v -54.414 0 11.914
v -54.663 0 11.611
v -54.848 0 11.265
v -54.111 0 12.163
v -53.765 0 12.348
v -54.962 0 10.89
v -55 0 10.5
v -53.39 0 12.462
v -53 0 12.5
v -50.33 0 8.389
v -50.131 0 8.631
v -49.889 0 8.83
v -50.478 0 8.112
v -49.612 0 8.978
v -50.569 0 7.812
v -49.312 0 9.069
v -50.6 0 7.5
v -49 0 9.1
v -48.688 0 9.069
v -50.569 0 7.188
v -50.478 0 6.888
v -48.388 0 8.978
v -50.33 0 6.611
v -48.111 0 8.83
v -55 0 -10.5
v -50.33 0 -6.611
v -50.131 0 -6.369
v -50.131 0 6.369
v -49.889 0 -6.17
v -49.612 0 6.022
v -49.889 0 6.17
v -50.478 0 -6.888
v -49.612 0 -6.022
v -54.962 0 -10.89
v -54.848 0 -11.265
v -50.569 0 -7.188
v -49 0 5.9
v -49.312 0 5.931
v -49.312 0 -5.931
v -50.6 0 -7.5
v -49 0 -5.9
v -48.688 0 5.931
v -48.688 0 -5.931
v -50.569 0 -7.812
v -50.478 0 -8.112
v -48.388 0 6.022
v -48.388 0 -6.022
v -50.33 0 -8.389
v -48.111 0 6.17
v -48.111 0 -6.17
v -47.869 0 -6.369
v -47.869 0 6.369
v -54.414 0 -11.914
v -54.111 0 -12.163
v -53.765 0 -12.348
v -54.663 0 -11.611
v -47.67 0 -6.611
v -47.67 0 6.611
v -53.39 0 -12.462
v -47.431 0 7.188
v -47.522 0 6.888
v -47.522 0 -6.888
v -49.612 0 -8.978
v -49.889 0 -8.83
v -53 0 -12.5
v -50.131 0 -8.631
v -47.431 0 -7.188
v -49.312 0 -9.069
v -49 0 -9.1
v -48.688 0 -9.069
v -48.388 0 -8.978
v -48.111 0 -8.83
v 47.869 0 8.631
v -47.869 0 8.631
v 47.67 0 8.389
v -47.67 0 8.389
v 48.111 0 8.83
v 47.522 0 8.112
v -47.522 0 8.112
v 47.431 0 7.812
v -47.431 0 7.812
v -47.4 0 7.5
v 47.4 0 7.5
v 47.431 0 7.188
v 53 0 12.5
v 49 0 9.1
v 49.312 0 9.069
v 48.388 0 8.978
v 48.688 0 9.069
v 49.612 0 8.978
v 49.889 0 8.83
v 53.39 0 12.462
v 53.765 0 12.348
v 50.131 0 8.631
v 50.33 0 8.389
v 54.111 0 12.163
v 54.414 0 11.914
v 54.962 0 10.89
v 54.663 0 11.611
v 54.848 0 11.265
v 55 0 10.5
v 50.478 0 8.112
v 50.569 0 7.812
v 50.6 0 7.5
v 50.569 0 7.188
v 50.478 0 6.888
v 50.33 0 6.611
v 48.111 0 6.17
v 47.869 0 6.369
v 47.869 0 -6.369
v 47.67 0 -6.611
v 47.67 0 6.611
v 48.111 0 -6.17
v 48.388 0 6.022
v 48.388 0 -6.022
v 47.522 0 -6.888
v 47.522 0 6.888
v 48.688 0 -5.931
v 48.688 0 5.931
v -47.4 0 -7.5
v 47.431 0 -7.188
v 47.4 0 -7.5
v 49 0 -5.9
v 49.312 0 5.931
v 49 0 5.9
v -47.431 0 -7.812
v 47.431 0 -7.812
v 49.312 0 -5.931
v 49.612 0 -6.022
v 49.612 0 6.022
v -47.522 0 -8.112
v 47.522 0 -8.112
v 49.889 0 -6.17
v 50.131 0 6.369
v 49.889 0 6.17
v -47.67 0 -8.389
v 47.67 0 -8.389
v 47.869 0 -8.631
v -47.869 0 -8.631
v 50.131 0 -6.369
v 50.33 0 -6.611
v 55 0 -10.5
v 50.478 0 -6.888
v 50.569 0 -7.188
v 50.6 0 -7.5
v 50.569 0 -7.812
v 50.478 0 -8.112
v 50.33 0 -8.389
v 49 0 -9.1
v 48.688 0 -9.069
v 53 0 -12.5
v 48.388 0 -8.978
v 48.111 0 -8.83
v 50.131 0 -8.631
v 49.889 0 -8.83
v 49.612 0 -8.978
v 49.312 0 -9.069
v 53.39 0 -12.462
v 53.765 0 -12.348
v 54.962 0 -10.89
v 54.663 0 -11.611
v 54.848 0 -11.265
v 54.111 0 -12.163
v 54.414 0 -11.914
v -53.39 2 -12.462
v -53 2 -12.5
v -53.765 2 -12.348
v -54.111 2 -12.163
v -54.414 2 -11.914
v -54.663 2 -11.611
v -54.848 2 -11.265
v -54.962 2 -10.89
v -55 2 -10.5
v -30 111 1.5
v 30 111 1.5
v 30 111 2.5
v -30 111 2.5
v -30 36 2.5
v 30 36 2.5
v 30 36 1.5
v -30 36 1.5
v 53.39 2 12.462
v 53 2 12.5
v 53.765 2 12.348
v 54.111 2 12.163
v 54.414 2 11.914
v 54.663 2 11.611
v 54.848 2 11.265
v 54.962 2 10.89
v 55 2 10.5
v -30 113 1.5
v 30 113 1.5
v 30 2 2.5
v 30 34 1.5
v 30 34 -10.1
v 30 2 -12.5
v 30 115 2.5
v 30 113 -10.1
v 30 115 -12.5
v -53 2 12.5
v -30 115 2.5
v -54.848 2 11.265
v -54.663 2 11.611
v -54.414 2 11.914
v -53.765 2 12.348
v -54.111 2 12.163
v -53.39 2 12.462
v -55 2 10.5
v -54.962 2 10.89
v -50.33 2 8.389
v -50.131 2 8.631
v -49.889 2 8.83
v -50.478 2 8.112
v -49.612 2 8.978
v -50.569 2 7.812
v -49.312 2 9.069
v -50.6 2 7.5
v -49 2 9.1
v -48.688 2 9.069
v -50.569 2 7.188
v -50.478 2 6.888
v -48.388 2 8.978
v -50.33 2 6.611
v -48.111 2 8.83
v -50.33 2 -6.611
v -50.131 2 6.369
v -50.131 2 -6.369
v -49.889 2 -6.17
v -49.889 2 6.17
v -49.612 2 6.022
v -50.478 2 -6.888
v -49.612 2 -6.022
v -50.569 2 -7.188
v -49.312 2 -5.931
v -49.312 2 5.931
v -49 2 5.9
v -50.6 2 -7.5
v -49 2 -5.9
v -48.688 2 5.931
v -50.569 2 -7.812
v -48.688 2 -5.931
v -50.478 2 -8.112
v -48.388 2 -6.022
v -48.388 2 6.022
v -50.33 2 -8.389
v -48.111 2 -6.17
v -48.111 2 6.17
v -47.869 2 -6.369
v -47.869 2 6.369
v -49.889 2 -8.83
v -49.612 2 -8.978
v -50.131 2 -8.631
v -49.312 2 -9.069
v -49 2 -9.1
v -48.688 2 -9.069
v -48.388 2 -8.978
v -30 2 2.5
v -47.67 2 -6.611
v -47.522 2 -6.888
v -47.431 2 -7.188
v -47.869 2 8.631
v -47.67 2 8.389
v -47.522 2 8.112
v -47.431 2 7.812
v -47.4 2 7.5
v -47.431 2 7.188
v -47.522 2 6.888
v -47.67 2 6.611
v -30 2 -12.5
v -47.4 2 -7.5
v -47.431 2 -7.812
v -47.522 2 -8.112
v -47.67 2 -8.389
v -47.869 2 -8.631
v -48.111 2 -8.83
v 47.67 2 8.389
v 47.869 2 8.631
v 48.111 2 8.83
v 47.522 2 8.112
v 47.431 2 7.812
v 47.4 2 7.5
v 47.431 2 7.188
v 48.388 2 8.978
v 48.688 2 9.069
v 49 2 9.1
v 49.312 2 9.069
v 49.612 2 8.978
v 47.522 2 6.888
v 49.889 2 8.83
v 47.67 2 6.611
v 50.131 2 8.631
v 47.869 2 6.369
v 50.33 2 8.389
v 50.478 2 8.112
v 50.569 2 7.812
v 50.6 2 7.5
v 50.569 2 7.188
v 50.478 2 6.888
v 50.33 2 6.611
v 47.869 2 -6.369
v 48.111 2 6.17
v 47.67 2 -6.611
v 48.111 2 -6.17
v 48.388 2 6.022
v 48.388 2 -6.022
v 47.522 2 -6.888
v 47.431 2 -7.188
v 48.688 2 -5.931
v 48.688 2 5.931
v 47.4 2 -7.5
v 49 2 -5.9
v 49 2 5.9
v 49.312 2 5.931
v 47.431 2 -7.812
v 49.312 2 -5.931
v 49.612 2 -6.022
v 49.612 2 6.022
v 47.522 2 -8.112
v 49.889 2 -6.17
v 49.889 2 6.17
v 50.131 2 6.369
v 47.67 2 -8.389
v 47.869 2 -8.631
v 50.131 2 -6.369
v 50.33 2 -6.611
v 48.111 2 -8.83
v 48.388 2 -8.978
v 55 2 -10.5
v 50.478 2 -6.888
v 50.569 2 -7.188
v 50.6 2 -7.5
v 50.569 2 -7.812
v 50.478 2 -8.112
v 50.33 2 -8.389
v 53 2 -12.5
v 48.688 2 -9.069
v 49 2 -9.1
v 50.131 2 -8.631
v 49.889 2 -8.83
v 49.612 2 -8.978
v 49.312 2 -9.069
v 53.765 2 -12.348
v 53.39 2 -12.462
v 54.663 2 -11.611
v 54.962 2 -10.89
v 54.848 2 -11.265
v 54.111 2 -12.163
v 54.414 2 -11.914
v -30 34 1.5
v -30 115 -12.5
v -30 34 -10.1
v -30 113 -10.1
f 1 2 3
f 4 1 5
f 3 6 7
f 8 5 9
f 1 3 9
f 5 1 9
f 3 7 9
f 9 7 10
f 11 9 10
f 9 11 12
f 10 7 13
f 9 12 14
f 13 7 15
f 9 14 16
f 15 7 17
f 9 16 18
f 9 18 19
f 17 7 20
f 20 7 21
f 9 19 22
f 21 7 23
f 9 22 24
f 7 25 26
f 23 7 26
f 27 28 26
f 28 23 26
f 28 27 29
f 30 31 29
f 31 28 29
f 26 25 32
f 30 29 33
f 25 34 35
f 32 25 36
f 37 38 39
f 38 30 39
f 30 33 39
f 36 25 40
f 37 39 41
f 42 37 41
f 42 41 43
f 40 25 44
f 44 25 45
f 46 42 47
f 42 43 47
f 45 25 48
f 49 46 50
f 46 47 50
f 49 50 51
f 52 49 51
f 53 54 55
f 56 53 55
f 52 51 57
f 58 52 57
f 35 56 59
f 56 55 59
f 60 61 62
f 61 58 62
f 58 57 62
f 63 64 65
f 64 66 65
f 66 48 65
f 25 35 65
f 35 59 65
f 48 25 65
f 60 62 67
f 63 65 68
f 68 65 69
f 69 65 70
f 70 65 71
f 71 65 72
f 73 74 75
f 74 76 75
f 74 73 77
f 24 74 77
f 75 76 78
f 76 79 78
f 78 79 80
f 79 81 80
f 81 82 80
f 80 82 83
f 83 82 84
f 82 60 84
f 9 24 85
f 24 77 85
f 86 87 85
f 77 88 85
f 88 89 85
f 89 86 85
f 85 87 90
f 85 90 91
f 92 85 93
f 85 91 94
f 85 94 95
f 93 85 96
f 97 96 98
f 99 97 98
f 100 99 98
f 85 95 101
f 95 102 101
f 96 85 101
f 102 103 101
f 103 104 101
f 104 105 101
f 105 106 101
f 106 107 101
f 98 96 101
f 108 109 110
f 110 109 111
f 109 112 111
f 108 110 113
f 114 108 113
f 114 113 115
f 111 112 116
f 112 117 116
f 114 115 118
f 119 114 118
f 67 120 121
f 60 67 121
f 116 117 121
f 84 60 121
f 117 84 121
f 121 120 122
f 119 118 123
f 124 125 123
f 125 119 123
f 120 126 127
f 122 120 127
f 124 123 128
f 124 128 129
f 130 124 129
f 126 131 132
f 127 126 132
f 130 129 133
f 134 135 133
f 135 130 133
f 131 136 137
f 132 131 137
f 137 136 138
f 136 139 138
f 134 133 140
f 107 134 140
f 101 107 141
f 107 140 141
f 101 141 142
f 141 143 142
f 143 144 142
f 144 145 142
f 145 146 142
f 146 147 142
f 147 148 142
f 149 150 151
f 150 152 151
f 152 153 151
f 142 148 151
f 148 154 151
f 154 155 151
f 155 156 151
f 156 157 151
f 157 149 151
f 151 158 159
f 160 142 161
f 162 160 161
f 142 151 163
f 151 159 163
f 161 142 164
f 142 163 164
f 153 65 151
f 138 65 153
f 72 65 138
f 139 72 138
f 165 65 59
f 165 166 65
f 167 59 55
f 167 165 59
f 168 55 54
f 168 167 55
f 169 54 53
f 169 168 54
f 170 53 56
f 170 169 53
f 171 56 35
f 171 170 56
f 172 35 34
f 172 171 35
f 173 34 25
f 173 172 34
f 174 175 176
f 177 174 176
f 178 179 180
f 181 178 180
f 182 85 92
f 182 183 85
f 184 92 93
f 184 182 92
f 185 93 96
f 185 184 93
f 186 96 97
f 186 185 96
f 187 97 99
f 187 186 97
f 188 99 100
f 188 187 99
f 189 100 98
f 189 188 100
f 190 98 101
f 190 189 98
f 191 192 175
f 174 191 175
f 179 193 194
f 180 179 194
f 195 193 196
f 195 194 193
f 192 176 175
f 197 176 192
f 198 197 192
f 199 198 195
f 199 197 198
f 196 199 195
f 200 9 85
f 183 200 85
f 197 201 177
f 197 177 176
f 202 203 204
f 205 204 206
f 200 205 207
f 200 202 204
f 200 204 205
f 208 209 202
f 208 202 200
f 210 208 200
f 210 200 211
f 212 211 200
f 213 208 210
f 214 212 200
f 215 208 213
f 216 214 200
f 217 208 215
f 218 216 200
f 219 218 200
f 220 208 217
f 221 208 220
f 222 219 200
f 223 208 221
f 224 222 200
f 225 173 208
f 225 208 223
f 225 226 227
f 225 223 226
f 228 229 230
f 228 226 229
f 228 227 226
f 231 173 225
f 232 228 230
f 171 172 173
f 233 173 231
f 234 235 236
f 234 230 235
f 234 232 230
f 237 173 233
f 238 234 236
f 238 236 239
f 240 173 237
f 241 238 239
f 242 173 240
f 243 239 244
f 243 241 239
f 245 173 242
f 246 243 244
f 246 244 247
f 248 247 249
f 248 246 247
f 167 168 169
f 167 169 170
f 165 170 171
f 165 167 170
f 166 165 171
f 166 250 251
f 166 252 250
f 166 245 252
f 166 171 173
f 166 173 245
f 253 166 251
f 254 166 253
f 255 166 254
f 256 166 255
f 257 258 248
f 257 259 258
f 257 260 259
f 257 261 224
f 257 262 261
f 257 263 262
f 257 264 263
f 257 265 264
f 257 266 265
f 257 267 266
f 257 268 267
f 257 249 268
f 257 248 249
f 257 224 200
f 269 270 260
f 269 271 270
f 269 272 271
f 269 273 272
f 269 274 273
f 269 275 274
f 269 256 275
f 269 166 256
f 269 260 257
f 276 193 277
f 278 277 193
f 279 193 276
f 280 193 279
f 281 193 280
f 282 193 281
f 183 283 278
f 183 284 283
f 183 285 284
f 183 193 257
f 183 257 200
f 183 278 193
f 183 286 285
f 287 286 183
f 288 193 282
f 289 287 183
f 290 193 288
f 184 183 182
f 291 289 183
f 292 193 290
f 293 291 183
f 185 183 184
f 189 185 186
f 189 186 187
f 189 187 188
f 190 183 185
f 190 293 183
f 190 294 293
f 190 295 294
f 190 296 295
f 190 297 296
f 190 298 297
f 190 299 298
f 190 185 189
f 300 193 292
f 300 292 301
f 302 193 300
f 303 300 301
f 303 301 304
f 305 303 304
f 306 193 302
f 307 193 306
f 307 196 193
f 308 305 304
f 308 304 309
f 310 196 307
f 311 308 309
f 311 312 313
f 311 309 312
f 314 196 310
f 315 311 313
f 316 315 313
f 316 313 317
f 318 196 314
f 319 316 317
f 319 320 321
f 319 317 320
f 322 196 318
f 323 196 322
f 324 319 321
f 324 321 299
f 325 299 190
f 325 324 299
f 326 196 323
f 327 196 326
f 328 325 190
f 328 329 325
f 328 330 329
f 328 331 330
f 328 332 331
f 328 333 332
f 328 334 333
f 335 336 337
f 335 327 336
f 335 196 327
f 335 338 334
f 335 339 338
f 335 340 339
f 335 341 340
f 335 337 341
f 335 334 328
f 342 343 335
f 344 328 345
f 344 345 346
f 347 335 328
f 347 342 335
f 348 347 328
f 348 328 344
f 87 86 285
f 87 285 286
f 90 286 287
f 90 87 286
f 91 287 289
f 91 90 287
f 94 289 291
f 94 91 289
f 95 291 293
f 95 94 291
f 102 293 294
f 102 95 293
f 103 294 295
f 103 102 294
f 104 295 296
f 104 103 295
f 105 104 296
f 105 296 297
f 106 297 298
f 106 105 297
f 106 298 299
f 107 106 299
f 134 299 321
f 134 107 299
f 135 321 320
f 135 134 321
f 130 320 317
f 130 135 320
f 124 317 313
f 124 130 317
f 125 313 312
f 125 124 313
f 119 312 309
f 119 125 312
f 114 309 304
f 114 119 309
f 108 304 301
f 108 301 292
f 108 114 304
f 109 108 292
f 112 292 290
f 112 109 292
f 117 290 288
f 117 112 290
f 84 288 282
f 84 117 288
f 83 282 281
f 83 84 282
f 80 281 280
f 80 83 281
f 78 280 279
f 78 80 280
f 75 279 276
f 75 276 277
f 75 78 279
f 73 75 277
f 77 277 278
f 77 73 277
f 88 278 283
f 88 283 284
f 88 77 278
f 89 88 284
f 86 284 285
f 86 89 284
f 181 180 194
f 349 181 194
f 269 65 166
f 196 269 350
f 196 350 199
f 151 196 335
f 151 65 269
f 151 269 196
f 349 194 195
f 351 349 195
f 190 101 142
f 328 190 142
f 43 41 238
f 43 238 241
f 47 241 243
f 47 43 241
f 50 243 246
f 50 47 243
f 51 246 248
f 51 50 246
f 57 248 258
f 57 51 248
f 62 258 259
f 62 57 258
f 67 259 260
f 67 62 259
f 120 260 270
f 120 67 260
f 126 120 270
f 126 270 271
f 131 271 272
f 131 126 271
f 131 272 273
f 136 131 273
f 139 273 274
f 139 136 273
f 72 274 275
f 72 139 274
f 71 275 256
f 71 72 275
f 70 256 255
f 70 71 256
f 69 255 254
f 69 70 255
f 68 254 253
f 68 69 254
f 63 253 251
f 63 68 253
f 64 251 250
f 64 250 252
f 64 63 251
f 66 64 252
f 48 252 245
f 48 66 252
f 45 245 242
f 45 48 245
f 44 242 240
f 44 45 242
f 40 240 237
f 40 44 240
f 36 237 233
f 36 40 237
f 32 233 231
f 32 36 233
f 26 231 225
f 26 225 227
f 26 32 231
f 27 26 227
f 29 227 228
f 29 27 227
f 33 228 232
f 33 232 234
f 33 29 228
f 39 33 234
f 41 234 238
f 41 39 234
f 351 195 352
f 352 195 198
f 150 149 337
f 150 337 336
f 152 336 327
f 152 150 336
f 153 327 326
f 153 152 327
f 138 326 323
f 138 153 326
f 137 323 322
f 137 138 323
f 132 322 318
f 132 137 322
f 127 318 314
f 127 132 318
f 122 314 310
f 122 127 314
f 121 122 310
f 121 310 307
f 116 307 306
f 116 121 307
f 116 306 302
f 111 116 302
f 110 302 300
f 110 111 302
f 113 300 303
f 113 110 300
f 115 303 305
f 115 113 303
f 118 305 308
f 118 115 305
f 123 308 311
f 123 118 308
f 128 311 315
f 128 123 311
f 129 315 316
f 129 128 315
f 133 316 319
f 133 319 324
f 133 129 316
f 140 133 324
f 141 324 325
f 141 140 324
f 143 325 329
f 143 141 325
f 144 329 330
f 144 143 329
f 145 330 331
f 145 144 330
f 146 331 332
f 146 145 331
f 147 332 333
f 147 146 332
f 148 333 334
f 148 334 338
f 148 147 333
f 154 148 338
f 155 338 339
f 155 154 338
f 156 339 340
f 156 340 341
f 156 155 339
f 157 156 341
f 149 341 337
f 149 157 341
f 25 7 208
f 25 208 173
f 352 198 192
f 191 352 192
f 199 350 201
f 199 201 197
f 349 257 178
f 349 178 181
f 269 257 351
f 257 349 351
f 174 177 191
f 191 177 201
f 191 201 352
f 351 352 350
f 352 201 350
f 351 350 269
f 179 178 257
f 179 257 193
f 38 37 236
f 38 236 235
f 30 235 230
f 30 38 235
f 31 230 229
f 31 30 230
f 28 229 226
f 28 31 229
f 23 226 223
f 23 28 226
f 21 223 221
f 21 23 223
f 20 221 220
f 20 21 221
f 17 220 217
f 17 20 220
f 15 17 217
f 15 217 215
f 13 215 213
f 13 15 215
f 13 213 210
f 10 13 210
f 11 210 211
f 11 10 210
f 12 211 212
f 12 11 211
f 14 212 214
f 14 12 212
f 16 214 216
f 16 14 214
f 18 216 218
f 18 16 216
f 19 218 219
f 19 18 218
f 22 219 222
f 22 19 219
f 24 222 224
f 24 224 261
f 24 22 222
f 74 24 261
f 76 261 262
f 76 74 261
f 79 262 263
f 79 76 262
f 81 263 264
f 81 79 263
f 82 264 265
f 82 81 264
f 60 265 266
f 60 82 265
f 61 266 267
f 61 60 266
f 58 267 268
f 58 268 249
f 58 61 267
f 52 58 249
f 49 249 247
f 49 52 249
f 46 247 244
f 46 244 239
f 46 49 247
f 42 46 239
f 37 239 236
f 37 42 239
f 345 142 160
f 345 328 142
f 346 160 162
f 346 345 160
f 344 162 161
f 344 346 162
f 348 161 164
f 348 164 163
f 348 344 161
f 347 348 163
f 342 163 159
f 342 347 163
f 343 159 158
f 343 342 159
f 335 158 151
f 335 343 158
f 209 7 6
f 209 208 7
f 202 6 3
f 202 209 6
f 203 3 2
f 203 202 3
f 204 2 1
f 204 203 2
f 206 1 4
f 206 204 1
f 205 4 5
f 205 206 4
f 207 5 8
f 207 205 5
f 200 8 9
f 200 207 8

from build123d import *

# Parameters (mm, degrees)
SKETCH_1_W          = 110
SKETCH_1_H          = 25
SKETCH_1_R          = 1.6
EXTRUDE_1_DEPTH     = 2
SKETCH_2_W          = 60
SKETCH_2_H          = 15
EXTRUDE_2_DEPTH     = 113
CUT_EXTRUDE_1_DEPTH = 60
FILLET_1_R          = 2
FILLET_2_R          = 2
FILLET_3_R          = 2
FILLET_4_R          = 2


with BuildPart() as part:
    # 草图1 → 凸台-拉伸1 (new body)
    with BuildSketch(Plane(origin=(0, 0, 0), x_dir=(1, 0, 0), z_dir=(0, 1, 0))):
        Rectangle(SKETCH_1_W, SKETCH_1_H)
        with Locations(Location((-49, 7.5, 0), (0, 0, 270))):
            Circle(SKETCH_1_R, mode=Mode.SUBTRACT)
        with Locations(Location((49, 7.5, 0), (0, 0, 90))):
            Circle(SKETCH_1_R, mode=Mode.SUBTRACT)
        with Locations(Location((49, -7.5, 0), (0, 0, 270))):
            Circle(SKETCH_1_R, mode=Mode.SUBTRACT)
        with Locations(Location((-49, -7.5, 0), (0, 0, 90))):
            Circle(SKETCH_1_R, mode=Mode.SUBTRACT)
    extrude(amount=EXTRUDE_1_DEPTH)

    # 草图2 → 凸台-拉伸2 (add)
    with BuildSketch(Plane(origin=(0, 115, 0), x_dir=(1, 0, 0), z_dir=(0, 1, 0))):
        with Locations((0, 5)):
            Rectangle(SKETCH_2_W, SKETCH_2_H)
    extrude(amount=-EXTRUDE_2_DEPTH)

    # 草图3 → 切除-拉伸1 (cut)
    with BuildSketch(Plane(origin=(30, 0, 0), x_dir=(0, 0, -1), z_dir=(1, 0, 0))):
        Polygon((-2.5, 36), (-1.5, 36), (-1.5, 34), (10.1, 34), (10.1, 113), (-1.5, 113), (-1.5, 111), (-2.5, 111), align=None)
    extrude(amount=-CUT_EXTRUDE_1_DEPTH, mode=Mode.SUBTRACT)

    # 圆角1
    fillet_1_edges = [part.edges().sort_by_distance(p)[0] for p in [
        (55, 1, 12.5),
    ]]
    fillet(fillet_1_edges, radius=FILLET_1_R)

    # 圆角2
    fillet_2_edges = [part.edges().sort_by_distance(p)[0] for p in [
        (55, 1, -12.5),
    ]]
    fillet(fillet_2_edges, radius=FILLET_2_R)

    # 圆角3
    fillet_3_edges = [part.edges().sort_by_distance(p)[0] for p in [
        (-55, 1, -12.5),
    ]]
    fillet(fillet_3_edges, radius=FILLET_3_R)

    # 圆角4
    fillet_4_edges = [part.edges().sort_by_distance(p)[0] for p in [
        (-55, 1, 12.5),
    ]]
    fillet(fillet_4_edges, radius=FILLET_4_R)


solid = part.part
